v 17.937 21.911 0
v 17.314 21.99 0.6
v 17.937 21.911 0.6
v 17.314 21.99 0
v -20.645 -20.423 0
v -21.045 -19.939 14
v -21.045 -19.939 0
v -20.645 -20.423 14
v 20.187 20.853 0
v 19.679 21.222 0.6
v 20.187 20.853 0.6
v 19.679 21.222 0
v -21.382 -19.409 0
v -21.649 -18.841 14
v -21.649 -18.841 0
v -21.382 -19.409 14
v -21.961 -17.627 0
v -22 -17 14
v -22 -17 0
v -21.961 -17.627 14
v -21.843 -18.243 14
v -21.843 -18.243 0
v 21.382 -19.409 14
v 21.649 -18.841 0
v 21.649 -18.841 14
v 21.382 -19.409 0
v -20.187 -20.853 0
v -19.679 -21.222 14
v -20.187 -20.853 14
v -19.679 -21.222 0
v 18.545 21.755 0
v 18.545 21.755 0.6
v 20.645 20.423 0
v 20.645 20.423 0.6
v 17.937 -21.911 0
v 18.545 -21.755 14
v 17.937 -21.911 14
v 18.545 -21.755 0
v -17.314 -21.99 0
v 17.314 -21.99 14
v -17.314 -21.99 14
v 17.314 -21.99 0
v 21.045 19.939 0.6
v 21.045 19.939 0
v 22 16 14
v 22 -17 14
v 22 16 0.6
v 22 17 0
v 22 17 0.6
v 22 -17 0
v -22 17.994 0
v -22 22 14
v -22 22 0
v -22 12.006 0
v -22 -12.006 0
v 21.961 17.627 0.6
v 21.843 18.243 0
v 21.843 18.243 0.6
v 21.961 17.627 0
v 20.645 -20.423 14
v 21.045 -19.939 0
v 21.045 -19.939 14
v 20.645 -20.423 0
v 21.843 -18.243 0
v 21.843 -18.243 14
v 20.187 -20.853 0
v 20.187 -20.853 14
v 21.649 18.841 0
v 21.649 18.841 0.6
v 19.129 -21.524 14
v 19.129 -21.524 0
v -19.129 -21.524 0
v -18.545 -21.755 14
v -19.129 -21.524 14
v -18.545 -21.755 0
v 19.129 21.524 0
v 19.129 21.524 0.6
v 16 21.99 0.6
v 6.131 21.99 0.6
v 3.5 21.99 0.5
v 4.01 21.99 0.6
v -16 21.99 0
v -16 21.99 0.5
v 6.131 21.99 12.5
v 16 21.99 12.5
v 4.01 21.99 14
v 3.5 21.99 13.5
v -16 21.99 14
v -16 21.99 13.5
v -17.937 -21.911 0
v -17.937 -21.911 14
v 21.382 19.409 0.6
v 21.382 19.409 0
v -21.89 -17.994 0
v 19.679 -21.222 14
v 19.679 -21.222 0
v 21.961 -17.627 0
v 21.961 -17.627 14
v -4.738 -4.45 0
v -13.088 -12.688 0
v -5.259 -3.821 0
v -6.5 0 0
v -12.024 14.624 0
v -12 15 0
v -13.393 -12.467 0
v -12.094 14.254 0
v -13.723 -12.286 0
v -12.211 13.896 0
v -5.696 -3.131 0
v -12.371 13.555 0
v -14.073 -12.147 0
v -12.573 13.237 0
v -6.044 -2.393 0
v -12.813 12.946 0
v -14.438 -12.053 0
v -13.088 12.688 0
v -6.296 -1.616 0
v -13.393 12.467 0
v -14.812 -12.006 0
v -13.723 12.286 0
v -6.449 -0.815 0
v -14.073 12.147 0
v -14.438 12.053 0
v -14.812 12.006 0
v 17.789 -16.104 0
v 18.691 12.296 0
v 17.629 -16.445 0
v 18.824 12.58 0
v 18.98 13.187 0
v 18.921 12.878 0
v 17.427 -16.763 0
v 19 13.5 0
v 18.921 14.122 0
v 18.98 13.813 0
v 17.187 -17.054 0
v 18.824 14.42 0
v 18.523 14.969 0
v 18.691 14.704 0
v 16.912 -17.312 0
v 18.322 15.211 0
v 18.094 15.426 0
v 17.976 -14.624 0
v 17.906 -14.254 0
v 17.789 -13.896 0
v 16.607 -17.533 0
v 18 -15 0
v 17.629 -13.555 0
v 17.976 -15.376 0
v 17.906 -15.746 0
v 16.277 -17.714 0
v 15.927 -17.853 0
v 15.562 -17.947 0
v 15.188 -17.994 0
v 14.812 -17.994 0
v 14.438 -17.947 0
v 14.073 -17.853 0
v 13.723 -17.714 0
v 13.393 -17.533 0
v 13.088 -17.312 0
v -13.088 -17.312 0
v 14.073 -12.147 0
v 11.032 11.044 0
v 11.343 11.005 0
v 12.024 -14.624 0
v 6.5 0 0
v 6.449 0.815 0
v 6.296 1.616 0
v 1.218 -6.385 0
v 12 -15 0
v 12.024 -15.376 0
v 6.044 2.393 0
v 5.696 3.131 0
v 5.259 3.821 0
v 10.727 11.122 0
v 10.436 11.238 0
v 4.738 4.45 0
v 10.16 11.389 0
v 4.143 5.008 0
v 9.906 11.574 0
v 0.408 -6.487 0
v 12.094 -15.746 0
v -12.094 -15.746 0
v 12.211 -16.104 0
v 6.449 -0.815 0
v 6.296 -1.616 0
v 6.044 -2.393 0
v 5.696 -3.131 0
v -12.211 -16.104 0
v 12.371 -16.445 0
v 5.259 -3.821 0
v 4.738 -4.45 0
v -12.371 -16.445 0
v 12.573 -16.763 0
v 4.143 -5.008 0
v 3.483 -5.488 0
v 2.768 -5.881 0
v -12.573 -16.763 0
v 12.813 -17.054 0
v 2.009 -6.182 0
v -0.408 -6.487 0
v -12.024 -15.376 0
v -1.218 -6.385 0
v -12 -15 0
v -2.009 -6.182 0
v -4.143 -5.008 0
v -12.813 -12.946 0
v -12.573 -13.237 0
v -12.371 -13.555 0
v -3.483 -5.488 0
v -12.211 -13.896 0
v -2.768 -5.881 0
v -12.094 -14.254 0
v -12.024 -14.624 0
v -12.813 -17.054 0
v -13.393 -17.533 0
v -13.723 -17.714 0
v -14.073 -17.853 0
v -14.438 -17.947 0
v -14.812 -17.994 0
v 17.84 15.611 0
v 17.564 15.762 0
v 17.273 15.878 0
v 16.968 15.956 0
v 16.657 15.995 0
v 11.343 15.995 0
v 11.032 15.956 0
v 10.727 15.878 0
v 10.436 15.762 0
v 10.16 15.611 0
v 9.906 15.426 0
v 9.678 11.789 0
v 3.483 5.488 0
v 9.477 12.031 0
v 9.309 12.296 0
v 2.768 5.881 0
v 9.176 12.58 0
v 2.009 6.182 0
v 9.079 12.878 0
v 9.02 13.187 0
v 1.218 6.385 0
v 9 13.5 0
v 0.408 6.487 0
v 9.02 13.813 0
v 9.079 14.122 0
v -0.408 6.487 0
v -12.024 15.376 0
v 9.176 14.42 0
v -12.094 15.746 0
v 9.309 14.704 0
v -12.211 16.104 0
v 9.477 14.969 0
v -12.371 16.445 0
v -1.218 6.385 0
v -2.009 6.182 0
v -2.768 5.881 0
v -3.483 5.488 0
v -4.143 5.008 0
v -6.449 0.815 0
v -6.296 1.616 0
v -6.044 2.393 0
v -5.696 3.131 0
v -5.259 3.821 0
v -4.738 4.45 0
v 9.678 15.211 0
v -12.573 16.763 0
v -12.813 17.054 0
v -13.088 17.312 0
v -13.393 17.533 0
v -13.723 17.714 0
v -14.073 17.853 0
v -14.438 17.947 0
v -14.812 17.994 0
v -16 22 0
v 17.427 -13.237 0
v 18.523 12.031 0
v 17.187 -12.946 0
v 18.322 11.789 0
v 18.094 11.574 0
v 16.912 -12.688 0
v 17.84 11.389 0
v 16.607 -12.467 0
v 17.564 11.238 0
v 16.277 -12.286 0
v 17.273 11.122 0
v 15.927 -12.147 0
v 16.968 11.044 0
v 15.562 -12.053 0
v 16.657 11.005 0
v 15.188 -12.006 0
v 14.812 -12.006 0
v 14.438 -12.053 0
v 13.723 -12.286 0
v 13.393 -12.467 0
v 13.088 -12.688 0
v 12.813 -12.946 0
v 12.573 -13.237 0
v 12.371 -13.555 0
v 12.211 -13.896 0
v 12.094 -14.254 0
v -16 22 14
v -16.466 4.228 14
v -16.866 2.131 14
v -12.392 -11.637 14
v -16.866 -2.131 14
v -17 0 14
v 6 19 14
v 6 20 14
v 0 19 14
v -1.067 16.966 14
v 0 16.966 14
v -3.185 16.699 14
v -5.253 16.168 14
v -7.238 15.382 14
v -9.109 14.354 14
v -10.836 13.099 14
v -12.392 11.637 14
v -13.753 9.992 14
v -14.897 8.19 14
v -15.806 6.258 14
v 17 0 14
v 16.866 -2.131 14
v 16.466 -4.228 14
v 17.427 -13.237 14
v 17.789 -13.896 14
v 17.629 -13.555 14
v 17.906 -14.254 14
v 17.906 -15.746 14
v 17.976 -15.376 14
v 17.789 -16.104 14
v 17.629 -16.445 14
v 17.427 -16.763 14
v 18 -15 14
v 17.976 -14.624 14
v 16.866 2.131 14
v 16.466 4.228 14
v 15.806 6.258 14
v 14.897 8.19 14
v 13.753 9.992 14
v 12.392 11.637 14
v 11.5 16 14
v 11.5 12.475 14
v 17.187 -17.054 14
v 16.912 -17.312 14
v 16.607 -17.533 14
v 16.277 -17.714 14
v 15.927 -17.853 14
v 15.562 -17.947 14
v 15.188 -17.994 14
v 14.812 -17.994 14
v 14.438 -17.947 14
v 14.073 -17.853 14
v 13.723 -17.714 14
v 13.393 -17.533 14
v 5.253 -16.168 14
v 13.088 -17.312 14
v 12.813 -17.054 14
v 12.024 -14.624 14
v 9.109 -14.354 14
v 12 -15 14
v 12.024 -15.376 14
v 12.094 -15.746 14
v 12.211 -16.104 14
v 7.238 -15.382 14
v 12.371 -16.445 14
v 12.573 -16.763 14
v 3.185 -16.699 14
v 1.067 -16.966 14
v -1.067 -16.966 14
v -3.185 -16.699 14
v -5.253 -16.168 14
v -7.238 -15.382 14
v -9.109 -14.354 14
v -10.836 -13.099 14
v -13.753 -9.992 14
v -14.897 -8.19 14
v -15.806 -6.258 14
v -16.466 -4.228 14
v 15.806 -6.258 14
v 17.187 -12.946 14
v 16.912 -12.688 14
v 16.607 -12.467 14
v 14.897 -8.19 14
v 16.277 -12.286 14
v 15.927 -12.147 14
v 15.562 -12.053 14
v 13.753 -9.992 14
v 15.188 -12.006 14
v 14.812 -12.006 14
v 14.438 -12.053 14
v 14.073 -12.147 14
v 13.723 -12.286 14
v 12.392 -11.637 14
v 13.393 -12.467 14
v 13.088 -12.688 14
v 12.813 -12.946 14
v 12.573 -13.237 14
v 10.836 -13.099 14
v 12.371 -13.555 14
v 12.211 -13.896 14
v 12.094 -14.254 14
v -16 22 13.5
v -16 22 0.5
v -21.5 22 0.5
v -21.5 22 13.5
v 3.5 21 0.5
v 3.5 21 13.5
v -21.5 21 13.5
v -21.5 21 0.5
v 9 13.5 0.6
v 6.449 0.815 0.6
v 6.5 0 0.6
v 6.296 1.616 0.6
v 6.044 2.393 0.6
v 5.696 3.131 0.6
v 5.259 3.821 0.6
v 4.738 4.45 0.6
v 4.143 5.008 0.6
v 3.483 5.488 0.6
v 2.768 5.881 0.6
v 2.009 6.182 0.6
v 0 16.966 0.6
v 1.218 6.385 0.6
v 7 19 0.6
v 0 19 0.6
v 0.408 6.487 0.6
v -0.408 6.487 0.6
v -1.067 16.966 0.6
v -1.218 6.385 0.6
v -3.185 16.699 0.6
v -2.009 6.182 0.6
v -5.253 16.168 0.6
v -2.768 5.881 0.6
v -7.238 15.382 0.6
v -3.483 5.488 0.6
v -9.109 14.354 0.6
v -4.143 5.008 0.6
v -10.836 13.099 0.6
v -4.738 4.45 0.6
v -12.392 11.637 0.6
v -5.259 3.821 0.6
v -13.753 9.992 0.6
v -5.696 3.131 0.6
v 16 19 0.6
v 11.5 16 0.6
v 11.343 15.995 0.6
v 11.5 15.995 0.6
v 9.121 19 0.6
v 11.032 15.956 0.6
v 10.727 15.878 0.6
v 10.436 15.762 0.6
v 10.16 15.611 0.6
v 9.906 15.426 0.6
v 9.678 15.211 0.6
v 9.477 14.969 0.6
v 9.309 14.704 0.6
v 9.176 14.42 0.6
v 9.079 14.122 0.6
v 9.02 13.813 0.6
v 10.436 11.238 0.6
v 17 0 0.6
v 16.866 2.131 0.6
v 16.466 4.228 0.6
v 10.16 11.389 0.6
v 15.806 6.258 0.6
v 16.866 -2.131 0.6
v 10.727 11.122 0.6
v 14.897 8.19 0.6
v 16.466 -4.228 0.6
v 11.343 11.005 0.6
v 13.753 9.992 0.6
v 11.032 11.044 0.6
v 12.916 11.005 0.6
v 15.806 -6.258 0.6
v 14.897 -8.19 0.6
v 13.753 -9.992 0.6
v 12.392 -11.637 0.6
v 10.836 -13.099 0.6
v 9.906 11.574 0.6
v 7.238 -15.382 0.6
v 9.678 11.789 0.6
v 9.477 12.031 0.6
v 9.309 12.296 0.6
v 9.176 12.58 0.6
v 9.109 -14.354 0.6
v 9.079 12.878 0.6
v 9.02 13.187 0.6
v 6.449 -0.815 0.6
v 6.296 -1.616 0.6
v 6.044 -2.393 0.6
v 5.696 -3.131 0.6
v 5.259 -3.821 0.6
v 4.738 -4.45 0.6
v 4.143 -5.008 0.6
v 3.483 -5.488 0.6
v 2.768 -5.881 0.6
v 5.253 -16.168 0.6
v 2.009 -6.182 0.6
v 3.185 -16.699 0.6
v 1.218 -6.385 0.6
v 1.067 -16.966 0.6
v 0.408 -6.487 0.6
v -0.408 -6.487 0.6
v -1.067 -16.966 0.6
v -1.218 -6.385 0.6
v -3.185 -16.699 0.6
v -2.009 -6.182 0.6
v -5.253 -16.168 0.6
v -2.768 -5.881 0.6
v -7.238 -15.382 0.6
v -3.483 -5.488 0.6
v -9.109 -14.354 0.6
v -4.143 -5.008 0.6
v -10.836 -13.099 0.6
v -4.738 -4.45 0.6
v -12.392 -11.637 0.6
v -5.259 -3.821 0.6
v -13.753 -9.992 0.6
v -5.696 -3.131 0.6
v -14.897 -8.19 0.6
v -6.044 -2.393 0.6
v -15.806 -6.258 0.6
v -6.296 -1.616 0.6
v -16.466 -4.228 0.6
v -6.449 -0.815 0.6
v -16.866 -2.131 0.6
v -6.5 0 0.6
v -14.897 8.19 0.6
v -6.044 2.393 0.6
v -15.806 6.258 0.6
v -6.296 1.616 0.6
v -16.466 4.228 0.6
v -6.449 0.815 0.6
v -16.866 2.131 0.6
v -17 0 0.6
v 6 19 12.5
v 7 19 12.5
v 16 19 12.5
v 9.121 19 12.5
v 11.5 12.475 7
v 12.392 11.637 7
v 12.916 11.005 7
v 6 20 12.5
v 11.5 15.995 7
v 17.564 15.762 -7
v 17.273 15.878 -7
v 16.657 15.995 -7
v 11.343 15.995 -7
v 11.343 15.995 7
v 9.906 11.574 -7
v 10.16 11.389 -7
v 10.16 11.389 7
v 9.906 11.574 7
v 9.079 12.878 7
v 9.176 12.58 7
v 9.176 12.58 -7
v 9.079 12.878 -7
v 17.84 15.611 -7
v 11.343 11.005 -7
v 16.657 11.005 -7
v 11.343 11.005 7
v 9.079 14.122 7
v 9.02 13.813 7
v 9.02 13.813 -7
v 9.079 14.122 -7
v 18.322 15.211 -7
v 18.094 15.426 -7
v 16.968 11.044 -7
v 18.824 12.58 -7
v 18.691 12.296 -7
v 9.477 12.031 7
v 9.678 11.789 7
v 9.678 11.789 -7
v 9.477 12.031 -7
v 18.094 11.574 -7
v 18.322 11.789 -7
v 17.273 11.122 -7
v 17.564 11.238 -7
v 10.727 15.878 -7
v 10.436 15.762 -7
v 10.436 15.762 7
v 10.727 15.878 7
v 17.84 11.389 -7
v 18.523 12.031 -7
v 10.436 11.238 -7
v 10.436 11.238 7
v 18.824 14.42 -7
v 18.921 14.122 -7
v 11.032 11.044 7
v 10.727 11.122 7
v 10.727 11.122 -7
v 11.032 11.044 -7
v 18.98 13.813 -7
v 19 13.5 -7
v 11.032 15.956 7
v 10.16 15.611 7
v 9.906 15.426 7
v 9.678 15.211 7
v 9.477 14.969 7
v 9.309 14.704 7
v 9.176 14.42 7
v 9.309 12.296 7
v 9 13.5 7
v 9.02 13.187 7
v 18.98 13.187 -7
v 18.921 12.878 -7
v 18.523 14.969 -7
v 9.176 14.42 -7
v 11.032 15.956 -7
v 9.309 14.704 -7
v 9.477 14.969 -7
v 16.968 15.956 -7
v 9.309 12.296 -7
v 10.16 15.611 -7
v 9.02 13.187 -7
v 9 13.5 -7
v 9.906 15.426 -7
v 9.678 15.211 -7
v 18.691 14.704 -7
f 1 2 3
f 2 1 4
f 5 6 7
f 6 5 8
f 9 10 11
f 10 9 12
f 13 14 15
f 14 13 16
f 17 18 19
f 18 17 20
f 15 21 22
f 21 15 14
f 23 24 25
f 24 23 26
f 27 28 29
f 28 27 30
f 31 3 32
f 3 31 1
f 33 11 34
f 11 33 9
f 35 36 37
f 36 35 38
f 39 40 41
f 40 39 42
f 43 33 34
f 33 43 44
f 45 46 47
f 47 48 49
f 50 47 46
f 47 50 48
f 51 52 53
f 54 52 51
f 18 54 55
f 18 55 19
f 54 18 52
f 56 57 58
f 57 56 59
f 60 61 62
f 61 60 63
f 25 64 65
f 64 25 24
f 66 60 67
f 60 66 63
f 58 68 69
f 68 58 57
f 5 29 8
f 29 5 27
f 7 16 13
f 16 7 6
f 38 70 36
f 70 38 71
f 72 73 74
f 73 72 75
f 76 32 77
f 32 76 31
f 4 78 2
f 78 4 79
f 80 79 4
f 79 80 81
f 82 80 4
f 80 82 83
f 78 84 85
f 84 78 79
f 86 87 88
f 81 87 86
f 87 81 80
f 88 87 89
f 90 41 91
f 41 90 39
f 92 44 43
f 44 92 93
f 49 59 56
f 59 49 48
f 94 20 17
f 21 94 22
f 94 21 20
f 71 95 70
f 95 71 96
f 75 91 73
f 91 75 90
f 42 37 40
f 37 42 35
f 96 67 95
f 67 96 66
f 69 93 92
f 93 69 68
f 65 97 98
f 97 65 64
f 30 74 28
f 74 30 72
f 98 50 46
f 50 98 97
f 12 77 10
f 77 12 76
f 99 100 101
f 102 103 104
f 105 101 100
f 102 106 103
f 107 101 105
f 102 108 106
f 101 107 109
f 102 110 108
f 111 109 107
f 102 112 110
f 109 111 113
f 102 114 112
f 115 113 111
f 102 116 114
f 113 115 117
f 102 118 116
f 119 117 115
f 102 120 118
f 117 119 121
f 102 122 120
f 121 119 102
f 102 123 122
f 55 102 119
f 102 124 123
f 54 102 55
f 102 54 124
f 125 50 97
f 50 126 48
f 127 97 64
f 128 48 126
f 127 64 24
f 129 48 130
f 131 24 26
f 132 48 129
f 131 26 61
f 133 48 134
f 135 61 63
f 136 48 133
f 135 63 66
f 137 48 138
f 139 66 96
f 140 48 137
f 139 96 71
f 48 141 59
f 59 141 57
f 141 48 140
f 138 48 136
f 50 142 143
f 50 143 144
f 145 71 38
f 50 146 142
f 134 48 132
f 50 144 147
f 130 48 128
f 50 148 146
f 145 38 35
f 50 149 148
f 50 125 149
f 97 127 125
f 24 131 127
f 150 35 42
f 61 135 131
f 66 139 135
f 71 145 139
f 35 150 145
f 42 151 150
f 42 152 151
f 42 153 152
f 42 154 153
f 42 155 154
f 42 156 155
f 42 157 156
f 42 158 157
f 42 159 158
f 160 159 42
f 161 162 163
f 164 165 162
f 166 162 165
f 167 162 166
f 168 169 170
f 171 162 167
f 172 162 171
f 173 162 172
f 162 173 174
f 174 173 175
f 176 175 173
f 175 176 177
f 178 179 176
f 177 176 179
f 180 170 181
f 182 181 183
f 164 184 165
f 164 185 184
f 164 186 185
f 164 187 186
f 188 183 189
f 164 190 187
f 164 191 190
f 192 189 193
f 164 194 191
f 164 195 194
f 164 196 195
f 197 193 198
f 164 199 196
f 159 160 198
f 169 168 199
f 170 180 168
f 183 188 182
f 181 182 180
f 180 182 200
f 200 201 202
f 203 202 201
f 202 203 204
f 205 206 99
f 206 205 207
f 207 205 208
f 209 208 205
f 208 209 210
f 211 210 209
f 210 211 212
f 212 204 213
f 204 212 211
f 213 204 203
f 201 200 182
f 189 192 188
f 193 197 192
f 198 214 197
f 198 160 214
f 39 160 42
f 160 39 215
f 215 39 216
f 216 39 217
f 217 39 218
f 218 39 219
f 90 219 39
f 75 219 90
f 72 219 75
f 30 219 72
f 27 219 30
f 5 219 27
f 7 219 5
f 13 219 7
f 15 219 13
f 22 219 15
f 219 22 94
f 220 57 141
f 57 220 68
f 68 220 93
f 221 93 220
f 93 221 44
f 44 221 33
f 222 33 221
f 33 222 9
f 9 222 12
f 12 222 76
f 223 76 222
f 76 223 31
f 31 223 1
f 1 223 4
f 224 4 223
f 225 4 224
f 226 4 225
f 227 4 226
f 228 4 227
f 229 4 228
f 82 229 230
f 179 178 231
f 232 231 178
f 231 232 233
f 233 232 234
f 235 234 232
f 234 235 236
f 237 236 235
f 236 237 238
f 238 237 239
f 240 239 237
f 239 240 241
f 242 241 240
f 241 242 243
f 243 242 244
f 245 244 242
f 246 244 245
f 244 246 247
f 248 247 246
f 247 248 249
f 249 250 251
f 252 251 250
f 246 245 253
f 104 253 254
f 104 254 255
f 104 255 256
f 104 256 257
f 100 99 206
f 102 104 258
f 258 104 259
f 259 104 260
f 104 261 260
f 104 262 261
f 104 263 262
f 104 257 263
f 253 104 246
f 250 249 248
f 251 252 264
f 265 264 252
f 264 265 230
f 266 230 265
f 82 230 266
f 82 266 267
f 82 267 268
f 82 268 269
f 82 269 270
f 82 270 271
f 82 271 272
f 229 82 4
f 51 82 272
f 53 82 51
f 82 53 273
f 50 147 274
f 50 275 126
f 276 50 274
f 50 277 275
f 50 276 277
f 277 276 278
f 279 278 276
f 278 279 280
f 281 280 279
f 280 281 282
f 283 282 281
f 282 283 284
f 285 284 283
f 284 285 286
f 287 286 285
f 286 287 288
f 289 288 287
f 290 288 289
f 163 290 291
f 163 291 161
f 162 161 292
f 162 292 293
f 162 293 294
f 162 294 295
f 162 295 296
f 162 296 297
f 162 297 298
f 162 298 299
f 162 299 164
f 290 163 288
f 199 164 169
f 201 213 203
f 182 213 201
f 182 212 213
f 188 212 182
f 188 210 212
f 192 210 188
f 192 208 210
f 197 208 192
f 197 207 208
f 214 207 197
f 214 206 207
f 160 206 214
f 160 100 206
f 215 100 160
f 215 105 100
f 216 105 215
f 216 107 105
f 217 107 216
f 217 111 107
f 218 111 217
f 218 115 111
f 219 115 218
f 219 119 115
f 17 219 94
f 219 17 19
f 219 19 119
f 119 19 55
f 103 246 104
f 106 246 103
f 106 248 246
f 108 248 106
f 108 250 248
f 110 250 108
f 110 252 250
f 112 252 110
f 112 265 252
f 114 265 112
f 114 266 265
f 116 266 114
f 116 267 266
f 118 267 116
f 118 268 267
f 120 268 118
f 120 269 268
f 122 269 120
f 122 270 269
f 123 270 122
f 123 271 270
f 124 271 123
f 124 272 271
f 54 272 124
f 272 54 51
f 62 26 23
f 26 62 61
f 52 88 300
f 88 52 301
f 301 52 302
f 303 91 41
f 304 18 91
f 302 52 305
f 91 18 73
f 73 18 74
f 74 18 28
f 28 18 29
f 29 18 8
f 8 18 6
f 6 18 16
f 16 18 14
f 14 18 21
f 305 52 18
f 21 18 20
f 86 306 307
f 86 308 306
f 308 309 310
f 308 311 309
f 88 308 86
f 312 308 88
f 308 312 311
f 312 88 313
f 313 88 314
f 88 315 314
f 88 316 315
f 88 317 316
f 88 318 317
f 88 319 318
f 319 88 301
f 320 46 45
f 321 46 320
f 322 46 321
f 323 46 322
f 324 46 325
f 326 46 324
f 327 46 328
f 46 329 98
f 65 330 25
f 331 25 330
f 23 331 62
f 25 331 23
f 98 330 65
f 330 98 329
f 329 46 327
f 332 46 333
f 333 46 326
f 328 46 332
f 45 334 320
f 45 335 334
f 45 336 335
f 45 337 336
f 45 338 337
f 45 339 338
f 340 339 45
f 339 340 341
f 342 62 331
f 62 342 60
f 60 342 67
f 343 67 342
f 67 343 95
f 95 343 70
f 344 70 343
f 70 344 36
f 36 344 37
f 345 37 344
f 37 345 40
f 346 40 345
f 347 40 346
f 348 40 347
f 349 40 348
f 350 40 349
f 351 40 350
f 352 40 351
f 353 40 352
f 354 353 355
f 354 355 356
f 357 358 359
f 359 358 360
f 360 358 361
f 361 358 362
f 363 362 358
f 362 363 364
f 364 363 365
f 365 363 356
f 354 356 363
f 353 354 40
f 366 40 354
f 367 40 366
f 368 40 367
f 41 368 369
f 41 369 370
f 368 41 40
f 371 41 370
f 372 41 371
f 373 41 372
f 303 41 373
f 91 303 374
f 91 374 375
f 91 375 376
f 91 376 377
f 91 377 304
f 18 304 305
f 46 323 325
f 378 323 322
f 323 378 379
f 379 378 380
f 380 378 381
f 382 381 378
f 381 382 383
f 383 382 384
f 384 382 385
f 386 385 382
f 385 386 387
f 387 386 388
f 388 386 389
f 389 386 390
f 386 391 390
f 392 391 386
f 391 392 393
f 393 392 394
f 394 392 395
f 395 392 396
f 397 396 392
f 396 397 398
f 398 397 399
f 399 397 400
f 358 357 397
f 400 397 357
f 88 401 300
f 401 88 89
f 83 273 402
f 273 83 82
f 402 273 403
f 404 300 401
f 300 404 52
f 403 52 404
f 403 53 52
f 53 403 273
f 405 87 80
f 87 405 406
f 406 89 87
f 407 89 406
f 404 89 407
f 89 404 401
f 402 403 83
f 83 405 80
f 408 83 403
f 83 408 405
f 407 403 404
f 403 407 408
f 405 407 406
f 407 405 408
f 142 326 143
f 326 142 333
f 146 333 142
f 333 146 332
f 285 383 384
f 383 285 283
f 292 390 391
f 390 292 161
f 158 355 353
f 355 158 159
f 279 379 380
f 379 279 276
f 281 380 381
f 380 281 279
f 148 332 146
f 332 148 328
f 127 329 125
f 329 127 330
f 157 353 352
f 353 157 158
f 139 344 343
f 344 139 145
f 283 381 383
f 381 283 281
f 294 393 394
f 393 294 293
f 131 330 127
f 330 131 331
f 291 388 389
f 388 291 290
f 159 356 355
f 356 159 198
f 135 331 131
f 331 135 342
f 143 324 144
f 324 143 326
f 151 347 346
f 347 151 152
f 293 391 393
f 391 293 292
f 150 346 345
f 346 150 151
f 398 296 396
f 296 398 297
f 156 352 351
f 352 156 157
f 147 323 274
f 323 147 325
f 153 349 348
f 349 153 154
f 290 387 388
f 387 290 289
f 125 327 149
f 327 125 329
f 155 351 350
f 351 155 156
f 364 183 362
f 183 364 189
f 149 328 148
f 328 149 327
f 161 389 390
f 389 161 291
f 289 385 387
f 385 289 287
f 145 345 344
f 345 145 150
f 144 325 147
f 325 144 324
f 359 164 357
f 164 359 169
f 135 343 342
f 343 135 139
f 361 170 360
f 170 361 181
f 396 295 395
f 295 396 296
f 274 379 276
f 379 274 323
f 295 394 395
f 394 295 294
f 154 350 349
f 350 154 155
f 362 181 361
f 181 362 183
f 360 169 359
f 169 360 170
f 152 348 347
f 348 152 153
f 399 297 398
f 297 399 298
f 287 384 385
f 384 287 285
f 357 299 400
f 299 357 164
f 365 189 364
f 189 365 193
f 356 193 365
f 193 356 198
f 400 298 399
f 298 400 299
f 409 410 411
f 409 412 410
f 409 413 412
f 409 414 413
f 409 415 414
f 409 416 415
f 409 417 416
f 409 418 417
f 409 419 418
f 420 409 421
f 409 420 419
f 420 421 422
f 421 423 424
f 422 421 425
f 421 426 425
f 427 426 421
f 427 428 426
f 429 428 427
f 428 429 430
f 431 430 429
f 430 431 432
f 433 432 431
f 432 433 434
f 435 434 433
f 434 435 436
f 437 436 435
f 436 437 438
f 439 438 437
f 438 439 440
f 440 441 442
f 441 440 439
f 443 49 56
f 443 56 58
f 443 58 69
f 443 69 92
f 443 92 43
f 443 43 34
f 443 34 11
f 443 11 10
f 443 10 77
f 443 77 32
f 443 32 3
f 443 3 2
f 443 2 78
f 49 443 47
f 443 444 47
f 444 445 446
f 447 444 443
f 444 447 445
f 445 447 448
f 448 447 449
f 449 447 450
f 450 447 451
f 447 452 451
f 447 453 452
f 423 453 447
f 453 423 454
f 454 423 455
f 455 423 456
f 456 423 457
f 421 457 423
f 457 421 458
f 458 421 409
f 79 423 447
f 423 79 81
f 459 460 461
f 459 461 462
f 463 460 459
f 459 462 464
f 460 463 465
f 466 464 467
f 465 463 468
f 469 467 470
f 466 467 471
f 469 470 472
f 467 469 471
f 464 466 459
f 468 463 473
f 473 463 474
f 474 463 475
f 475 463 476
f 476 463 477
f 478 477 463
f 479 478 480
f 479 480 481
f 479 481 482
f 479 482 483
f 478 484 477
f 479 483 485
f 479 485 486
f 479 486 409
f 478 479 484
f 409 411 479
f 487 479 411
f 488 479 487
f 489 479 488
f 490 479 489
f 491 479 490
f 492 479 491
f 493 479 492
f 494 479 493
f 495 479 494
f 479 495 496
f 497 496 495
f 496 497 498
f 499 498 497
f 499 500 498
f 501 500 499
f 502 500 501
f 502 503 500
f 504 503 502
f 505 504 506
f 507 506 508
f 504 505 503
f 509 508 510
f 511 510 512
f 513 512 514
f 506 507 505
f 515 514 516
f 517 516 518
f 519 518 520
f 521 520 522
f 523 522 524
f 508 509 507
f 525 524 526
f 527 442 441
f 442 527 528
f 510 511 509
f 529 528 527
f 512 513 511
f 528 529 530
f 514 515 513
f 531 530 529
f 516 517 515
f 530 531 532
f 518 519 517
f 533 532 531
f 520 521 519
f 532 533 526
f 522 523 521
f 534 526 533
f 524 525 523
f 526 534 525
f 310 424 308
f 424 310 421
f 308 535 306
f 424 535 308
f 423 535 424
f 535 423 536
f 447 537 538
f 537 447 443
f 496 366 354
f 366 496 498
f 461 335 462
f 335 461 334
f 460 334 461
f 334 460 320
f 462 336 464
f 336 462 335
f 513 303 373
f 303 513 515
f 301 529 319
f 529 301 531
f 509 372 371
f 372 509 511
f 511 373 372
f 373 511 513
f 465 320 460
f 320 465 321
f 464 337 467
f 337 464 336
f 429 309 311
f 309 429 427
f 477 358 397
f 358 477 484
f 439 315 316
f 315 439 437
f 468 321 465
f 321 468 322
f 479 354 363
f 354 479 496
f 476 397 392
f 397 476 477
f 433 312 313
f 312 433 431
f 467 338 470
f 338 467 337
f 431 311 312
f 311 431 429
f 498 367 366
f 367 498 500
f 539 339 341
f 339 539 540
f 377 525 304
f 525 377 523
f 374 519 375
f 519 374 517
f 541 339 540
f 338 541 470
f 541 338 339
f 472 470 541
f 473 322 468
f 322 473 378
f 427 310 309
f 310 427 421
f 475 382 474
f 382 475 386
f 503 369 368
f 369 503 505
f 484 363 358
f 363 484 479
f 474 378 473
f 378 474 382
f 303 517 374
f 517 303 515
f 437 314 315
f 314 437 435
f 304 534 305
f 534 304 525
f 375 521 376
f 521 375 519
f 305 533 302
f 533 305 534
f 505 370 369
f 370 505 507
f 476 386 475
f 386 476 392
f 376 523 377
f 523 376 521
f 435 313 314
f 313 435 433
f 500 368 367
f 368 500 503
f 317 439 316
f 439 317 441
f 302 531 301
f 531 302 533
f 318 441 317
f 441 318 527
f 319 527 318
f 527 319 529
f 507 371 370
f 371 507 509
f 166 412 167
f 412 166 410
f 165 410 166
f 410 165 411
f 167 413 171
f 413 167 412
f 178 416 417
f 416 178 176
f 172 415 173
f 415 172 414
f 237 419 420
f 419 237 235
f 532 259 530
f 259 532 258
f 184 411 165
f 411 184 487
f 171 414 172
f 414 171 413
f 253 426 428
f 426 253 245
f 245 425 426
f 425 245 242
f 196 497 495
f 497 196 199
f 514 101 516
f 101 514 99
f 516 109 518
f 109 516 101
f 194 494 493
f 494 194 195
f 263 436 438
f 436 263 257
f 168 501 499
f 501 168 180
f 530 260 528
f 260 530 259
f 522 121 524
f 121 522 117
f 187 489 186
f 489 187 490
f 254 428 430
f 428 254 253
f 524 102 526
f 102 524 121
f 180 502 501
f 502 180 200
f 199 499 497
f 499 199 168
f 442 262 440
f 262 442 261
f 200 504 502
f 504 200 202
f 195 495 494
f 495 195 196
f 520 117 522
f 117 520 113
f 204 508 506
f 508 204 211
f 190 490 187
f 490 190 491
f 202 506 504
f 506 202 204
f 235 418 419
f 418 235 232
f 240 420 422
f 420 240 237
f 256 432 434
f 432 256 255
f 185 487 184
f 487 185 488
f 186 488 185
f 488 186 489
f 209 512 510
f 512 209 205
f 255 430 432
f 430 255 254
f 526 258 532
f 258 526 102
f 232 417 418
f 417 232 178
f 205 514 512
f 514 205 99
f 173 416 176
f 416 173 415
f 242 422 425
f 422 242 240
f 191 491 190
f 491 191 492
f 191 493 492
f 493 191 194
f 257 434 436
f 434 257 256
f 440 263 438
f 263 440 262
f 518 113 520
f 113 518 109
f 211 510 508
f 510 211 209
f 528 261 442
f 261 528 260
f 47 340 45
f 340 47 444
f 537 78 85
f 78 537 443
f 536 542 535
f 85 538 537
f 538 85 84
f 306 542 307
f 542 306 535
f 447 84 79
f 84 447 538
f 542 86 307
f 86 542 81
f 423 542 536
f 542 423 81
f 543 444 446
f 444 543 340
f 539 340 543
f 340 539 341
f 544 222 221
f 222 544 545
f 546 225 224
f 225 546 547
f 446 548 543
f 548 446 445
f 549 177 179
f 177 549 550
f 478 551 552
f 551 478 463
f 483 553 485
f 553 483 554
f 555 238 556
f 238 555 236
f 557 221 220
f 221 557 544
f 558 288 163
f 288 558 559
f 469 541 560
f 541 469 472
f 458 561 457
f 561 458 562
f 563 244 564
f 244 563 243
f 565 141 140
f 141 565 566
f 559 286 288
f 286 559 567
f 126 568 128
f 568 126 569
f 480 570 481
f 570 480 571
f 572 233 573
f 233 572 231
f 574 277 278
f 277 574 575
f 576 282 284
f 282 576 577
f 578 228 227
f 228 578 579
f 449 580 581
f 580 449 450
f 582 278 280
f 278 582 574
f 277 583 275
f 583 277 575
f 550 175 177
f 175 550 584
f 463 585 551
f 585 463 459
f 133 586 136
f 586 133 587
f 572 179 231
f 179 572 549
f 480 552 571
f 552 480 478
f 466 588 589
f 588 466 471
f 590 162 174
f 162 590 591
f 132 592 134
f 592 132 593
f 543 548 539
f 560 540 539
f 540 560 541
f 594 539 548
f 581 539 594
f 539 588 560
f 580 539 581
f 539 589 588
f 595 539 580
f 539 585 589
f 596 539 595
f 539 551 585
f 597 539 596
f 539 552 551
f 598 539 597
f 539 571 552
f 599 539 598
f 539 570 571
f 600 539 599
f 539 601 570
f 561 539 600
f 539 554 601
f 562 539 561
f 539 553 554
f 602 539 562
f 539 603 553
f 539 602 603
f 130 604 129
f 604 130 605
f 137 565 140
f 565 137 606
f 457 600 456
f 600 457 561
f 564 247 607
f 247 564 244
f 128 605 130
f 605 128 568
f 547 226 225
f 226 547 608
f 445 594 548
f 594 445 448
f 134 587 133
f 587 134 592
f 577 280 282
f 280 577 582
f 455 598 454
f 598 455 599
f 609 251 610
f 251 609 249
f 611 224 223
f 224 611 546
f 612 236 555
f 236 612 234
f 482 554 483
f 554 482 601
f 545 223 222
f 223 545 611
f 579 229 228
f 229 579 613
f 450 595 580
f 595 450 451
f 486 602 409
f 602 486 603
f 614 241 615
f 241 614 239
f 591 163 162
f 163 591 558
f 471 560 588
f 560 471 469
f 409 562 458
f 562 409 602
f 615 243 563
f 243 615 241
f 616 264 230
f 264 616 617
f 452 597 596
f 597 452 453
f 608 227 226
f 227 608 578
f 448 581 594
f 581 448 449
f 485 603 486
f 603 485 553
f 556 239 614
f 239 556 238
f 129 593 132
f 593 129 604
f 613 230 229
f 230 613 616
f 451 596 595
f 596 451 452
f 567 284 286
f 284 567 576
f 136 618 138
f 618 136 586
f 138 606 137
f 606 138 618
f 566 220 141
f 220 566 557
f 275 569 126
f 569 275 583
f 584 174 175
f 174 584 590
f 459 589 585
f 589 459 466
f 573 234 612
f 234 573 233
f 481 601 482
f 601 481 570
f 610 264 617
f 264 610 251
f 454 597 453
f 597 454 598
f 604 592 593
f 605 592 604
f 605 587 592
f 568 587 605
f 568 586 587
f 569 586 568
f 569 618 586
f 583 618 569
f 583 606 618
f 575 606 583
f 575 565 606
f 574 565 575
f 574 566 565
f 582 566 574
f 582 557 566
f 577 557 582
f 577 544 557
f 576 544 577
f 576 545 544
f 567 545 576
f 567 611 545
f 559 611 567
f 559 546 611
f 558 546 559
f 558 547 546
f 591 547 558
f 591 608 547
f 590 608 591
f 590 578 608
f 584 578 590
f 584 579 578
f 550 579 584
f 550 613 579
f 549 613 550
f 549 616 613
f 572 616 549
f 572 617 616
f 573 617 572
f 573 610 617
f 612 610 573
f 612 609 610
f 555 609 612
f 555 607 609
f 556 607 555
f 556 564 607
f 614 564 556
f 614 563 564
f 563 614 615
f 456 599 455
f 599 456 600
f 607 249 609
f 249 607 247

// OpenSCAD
$fn = 50;


union() {
	difference() {
		union() {
			hull() {
				translate(v = [-17.0000000000, 17.0000000000, 0]) {
					cylinder(h = 14, r = 5);
				}
				translate(v = [17.0000000000, 17.0000000000, 0]) {
					cylinder(h = 14, r = 5);
				}
				translate(v = [-17.0000000000, -17.0000000000, 0]) {
					cylinder(h = 14, r = 5);
				}
				translate(v = [17.0000000000, -17.0000000000, 0]) {
					cylinder(h = 14, r = 5);
				}
			}
			translate(v = [-22.0000000000, 16.0000000000, 0]) {
				cube(size = [6, 6, 14]);
			}
		}
		union() {
			translate(v = [-22.5000000000, -15.0000000000, -250.0000000000]) {
				rotate(a = [0, 0, 0]) {
					difference() {
						union() {
							hull() {
								translate(v = [7.5000000000, 0, 0]) {
									cylinder(h = 250, r = 3.0000000000, r1 = 3.0000000000, r2 = 3.0000000000);
								}
								translate(v = [-7.5000000000, 0, 0]) {
									cylinder(h = 250, r = 3.0000000000, r1 = 3.0000000000, r2 = 3.0000000000);
								}
							}
						}
						union();
					}
				}
			}
			translate(v = [-22.5000000000, 15.0000000000, -250.0000000000]) {
				rotate(a = [0, 0, 0]) {
					difference() {
						union() {
							hull() {
								translate(v = [7.5000000000, 0, 0]) {
									cylinder(h = 250, r = 3.0000000000, r1 = 3.0000000000, r2 = 3.0000000000);
								}
								translate(v = [-7.5000000000, 0, 0]) {
									cylinder(h = 250, r = 3.0000000000, r1 = 3.0000000000, r2 = 3.0000000000);
								}
							}
						}
						union();
					}
				}
			}
			translate(v = [-21.5000000000, 21.0000000000, 0.5000000000]) {
				cube(size = [25, 1, 13.0000000000]);
			}
			translate(v = [15.0000000000, -15.0000000000, 0]) {
				cylinder(h = 100, r = 3.0000000000);
			}
			translate(v = [0.0000000000, 11.0000000000, 0.6000000000]) {
				cube(size = [11, 8, 16.4000000000]);
			}
			translate(v = [0, 0, 0.6000000000]) {
				cylinder(h = 16.4000000000, r = 17.0000000000);
			}
			translate(v = [0, 0, -7.0000000000]) {
				cylinder(h = 14, r = 6.5000000000);
			}
			translate(v = [0.0000000000, 16.0000000000, 0.6000000000]) {
				cube(size = [22.0000000000, 3, 16.4000000000]);
			}
			translate(v = [16.0000000000, 16.0000000000, 0.6000000000]) {
				cube(size = [6, 6, 16.4000000000]);
			}
			translate(v = [6.0000000000, 16.0000000000, 12.5000000000]) {
				cube(size = [16, 6, 1.5000000000]);
			}
			translate(v = [3.2500000000, 22.7500000000, 0.6000000000]) {
				rotate(a = [0, 0, -45]) {
					cube(size = [7.5000000000, 1.5000000000, 16.4000000000]);
				}
			}
			translate(v = [2.5000000000, 11.0000000000, 0.6000000000]) {
				cube(size = [9.0000000000, 5, 13.4000000000]);
			}
		}
	}
	union() {
		translate(v = [14, 13.5000000000, -7.0000000000]) {
			rotate(a = [0, 0, 0]) {
				difference() {
					union() {
						#hull() {
							#translate(v = [2.5000000000, 0, 0]) {
								cylinder(h = 14, r = 2.5000000000, r1 = 2.5000000000, r2 = 2.5000000000);
							}
							#translate(v = [-2.5000000000, 0, 0]) {
								cylinder(h = 14, r = 2.5000000000, r1 = 2.5000000000, r2 = 2.5000000000);
							}
						}
					}
					union();
				}
			}
		}
	}
}
